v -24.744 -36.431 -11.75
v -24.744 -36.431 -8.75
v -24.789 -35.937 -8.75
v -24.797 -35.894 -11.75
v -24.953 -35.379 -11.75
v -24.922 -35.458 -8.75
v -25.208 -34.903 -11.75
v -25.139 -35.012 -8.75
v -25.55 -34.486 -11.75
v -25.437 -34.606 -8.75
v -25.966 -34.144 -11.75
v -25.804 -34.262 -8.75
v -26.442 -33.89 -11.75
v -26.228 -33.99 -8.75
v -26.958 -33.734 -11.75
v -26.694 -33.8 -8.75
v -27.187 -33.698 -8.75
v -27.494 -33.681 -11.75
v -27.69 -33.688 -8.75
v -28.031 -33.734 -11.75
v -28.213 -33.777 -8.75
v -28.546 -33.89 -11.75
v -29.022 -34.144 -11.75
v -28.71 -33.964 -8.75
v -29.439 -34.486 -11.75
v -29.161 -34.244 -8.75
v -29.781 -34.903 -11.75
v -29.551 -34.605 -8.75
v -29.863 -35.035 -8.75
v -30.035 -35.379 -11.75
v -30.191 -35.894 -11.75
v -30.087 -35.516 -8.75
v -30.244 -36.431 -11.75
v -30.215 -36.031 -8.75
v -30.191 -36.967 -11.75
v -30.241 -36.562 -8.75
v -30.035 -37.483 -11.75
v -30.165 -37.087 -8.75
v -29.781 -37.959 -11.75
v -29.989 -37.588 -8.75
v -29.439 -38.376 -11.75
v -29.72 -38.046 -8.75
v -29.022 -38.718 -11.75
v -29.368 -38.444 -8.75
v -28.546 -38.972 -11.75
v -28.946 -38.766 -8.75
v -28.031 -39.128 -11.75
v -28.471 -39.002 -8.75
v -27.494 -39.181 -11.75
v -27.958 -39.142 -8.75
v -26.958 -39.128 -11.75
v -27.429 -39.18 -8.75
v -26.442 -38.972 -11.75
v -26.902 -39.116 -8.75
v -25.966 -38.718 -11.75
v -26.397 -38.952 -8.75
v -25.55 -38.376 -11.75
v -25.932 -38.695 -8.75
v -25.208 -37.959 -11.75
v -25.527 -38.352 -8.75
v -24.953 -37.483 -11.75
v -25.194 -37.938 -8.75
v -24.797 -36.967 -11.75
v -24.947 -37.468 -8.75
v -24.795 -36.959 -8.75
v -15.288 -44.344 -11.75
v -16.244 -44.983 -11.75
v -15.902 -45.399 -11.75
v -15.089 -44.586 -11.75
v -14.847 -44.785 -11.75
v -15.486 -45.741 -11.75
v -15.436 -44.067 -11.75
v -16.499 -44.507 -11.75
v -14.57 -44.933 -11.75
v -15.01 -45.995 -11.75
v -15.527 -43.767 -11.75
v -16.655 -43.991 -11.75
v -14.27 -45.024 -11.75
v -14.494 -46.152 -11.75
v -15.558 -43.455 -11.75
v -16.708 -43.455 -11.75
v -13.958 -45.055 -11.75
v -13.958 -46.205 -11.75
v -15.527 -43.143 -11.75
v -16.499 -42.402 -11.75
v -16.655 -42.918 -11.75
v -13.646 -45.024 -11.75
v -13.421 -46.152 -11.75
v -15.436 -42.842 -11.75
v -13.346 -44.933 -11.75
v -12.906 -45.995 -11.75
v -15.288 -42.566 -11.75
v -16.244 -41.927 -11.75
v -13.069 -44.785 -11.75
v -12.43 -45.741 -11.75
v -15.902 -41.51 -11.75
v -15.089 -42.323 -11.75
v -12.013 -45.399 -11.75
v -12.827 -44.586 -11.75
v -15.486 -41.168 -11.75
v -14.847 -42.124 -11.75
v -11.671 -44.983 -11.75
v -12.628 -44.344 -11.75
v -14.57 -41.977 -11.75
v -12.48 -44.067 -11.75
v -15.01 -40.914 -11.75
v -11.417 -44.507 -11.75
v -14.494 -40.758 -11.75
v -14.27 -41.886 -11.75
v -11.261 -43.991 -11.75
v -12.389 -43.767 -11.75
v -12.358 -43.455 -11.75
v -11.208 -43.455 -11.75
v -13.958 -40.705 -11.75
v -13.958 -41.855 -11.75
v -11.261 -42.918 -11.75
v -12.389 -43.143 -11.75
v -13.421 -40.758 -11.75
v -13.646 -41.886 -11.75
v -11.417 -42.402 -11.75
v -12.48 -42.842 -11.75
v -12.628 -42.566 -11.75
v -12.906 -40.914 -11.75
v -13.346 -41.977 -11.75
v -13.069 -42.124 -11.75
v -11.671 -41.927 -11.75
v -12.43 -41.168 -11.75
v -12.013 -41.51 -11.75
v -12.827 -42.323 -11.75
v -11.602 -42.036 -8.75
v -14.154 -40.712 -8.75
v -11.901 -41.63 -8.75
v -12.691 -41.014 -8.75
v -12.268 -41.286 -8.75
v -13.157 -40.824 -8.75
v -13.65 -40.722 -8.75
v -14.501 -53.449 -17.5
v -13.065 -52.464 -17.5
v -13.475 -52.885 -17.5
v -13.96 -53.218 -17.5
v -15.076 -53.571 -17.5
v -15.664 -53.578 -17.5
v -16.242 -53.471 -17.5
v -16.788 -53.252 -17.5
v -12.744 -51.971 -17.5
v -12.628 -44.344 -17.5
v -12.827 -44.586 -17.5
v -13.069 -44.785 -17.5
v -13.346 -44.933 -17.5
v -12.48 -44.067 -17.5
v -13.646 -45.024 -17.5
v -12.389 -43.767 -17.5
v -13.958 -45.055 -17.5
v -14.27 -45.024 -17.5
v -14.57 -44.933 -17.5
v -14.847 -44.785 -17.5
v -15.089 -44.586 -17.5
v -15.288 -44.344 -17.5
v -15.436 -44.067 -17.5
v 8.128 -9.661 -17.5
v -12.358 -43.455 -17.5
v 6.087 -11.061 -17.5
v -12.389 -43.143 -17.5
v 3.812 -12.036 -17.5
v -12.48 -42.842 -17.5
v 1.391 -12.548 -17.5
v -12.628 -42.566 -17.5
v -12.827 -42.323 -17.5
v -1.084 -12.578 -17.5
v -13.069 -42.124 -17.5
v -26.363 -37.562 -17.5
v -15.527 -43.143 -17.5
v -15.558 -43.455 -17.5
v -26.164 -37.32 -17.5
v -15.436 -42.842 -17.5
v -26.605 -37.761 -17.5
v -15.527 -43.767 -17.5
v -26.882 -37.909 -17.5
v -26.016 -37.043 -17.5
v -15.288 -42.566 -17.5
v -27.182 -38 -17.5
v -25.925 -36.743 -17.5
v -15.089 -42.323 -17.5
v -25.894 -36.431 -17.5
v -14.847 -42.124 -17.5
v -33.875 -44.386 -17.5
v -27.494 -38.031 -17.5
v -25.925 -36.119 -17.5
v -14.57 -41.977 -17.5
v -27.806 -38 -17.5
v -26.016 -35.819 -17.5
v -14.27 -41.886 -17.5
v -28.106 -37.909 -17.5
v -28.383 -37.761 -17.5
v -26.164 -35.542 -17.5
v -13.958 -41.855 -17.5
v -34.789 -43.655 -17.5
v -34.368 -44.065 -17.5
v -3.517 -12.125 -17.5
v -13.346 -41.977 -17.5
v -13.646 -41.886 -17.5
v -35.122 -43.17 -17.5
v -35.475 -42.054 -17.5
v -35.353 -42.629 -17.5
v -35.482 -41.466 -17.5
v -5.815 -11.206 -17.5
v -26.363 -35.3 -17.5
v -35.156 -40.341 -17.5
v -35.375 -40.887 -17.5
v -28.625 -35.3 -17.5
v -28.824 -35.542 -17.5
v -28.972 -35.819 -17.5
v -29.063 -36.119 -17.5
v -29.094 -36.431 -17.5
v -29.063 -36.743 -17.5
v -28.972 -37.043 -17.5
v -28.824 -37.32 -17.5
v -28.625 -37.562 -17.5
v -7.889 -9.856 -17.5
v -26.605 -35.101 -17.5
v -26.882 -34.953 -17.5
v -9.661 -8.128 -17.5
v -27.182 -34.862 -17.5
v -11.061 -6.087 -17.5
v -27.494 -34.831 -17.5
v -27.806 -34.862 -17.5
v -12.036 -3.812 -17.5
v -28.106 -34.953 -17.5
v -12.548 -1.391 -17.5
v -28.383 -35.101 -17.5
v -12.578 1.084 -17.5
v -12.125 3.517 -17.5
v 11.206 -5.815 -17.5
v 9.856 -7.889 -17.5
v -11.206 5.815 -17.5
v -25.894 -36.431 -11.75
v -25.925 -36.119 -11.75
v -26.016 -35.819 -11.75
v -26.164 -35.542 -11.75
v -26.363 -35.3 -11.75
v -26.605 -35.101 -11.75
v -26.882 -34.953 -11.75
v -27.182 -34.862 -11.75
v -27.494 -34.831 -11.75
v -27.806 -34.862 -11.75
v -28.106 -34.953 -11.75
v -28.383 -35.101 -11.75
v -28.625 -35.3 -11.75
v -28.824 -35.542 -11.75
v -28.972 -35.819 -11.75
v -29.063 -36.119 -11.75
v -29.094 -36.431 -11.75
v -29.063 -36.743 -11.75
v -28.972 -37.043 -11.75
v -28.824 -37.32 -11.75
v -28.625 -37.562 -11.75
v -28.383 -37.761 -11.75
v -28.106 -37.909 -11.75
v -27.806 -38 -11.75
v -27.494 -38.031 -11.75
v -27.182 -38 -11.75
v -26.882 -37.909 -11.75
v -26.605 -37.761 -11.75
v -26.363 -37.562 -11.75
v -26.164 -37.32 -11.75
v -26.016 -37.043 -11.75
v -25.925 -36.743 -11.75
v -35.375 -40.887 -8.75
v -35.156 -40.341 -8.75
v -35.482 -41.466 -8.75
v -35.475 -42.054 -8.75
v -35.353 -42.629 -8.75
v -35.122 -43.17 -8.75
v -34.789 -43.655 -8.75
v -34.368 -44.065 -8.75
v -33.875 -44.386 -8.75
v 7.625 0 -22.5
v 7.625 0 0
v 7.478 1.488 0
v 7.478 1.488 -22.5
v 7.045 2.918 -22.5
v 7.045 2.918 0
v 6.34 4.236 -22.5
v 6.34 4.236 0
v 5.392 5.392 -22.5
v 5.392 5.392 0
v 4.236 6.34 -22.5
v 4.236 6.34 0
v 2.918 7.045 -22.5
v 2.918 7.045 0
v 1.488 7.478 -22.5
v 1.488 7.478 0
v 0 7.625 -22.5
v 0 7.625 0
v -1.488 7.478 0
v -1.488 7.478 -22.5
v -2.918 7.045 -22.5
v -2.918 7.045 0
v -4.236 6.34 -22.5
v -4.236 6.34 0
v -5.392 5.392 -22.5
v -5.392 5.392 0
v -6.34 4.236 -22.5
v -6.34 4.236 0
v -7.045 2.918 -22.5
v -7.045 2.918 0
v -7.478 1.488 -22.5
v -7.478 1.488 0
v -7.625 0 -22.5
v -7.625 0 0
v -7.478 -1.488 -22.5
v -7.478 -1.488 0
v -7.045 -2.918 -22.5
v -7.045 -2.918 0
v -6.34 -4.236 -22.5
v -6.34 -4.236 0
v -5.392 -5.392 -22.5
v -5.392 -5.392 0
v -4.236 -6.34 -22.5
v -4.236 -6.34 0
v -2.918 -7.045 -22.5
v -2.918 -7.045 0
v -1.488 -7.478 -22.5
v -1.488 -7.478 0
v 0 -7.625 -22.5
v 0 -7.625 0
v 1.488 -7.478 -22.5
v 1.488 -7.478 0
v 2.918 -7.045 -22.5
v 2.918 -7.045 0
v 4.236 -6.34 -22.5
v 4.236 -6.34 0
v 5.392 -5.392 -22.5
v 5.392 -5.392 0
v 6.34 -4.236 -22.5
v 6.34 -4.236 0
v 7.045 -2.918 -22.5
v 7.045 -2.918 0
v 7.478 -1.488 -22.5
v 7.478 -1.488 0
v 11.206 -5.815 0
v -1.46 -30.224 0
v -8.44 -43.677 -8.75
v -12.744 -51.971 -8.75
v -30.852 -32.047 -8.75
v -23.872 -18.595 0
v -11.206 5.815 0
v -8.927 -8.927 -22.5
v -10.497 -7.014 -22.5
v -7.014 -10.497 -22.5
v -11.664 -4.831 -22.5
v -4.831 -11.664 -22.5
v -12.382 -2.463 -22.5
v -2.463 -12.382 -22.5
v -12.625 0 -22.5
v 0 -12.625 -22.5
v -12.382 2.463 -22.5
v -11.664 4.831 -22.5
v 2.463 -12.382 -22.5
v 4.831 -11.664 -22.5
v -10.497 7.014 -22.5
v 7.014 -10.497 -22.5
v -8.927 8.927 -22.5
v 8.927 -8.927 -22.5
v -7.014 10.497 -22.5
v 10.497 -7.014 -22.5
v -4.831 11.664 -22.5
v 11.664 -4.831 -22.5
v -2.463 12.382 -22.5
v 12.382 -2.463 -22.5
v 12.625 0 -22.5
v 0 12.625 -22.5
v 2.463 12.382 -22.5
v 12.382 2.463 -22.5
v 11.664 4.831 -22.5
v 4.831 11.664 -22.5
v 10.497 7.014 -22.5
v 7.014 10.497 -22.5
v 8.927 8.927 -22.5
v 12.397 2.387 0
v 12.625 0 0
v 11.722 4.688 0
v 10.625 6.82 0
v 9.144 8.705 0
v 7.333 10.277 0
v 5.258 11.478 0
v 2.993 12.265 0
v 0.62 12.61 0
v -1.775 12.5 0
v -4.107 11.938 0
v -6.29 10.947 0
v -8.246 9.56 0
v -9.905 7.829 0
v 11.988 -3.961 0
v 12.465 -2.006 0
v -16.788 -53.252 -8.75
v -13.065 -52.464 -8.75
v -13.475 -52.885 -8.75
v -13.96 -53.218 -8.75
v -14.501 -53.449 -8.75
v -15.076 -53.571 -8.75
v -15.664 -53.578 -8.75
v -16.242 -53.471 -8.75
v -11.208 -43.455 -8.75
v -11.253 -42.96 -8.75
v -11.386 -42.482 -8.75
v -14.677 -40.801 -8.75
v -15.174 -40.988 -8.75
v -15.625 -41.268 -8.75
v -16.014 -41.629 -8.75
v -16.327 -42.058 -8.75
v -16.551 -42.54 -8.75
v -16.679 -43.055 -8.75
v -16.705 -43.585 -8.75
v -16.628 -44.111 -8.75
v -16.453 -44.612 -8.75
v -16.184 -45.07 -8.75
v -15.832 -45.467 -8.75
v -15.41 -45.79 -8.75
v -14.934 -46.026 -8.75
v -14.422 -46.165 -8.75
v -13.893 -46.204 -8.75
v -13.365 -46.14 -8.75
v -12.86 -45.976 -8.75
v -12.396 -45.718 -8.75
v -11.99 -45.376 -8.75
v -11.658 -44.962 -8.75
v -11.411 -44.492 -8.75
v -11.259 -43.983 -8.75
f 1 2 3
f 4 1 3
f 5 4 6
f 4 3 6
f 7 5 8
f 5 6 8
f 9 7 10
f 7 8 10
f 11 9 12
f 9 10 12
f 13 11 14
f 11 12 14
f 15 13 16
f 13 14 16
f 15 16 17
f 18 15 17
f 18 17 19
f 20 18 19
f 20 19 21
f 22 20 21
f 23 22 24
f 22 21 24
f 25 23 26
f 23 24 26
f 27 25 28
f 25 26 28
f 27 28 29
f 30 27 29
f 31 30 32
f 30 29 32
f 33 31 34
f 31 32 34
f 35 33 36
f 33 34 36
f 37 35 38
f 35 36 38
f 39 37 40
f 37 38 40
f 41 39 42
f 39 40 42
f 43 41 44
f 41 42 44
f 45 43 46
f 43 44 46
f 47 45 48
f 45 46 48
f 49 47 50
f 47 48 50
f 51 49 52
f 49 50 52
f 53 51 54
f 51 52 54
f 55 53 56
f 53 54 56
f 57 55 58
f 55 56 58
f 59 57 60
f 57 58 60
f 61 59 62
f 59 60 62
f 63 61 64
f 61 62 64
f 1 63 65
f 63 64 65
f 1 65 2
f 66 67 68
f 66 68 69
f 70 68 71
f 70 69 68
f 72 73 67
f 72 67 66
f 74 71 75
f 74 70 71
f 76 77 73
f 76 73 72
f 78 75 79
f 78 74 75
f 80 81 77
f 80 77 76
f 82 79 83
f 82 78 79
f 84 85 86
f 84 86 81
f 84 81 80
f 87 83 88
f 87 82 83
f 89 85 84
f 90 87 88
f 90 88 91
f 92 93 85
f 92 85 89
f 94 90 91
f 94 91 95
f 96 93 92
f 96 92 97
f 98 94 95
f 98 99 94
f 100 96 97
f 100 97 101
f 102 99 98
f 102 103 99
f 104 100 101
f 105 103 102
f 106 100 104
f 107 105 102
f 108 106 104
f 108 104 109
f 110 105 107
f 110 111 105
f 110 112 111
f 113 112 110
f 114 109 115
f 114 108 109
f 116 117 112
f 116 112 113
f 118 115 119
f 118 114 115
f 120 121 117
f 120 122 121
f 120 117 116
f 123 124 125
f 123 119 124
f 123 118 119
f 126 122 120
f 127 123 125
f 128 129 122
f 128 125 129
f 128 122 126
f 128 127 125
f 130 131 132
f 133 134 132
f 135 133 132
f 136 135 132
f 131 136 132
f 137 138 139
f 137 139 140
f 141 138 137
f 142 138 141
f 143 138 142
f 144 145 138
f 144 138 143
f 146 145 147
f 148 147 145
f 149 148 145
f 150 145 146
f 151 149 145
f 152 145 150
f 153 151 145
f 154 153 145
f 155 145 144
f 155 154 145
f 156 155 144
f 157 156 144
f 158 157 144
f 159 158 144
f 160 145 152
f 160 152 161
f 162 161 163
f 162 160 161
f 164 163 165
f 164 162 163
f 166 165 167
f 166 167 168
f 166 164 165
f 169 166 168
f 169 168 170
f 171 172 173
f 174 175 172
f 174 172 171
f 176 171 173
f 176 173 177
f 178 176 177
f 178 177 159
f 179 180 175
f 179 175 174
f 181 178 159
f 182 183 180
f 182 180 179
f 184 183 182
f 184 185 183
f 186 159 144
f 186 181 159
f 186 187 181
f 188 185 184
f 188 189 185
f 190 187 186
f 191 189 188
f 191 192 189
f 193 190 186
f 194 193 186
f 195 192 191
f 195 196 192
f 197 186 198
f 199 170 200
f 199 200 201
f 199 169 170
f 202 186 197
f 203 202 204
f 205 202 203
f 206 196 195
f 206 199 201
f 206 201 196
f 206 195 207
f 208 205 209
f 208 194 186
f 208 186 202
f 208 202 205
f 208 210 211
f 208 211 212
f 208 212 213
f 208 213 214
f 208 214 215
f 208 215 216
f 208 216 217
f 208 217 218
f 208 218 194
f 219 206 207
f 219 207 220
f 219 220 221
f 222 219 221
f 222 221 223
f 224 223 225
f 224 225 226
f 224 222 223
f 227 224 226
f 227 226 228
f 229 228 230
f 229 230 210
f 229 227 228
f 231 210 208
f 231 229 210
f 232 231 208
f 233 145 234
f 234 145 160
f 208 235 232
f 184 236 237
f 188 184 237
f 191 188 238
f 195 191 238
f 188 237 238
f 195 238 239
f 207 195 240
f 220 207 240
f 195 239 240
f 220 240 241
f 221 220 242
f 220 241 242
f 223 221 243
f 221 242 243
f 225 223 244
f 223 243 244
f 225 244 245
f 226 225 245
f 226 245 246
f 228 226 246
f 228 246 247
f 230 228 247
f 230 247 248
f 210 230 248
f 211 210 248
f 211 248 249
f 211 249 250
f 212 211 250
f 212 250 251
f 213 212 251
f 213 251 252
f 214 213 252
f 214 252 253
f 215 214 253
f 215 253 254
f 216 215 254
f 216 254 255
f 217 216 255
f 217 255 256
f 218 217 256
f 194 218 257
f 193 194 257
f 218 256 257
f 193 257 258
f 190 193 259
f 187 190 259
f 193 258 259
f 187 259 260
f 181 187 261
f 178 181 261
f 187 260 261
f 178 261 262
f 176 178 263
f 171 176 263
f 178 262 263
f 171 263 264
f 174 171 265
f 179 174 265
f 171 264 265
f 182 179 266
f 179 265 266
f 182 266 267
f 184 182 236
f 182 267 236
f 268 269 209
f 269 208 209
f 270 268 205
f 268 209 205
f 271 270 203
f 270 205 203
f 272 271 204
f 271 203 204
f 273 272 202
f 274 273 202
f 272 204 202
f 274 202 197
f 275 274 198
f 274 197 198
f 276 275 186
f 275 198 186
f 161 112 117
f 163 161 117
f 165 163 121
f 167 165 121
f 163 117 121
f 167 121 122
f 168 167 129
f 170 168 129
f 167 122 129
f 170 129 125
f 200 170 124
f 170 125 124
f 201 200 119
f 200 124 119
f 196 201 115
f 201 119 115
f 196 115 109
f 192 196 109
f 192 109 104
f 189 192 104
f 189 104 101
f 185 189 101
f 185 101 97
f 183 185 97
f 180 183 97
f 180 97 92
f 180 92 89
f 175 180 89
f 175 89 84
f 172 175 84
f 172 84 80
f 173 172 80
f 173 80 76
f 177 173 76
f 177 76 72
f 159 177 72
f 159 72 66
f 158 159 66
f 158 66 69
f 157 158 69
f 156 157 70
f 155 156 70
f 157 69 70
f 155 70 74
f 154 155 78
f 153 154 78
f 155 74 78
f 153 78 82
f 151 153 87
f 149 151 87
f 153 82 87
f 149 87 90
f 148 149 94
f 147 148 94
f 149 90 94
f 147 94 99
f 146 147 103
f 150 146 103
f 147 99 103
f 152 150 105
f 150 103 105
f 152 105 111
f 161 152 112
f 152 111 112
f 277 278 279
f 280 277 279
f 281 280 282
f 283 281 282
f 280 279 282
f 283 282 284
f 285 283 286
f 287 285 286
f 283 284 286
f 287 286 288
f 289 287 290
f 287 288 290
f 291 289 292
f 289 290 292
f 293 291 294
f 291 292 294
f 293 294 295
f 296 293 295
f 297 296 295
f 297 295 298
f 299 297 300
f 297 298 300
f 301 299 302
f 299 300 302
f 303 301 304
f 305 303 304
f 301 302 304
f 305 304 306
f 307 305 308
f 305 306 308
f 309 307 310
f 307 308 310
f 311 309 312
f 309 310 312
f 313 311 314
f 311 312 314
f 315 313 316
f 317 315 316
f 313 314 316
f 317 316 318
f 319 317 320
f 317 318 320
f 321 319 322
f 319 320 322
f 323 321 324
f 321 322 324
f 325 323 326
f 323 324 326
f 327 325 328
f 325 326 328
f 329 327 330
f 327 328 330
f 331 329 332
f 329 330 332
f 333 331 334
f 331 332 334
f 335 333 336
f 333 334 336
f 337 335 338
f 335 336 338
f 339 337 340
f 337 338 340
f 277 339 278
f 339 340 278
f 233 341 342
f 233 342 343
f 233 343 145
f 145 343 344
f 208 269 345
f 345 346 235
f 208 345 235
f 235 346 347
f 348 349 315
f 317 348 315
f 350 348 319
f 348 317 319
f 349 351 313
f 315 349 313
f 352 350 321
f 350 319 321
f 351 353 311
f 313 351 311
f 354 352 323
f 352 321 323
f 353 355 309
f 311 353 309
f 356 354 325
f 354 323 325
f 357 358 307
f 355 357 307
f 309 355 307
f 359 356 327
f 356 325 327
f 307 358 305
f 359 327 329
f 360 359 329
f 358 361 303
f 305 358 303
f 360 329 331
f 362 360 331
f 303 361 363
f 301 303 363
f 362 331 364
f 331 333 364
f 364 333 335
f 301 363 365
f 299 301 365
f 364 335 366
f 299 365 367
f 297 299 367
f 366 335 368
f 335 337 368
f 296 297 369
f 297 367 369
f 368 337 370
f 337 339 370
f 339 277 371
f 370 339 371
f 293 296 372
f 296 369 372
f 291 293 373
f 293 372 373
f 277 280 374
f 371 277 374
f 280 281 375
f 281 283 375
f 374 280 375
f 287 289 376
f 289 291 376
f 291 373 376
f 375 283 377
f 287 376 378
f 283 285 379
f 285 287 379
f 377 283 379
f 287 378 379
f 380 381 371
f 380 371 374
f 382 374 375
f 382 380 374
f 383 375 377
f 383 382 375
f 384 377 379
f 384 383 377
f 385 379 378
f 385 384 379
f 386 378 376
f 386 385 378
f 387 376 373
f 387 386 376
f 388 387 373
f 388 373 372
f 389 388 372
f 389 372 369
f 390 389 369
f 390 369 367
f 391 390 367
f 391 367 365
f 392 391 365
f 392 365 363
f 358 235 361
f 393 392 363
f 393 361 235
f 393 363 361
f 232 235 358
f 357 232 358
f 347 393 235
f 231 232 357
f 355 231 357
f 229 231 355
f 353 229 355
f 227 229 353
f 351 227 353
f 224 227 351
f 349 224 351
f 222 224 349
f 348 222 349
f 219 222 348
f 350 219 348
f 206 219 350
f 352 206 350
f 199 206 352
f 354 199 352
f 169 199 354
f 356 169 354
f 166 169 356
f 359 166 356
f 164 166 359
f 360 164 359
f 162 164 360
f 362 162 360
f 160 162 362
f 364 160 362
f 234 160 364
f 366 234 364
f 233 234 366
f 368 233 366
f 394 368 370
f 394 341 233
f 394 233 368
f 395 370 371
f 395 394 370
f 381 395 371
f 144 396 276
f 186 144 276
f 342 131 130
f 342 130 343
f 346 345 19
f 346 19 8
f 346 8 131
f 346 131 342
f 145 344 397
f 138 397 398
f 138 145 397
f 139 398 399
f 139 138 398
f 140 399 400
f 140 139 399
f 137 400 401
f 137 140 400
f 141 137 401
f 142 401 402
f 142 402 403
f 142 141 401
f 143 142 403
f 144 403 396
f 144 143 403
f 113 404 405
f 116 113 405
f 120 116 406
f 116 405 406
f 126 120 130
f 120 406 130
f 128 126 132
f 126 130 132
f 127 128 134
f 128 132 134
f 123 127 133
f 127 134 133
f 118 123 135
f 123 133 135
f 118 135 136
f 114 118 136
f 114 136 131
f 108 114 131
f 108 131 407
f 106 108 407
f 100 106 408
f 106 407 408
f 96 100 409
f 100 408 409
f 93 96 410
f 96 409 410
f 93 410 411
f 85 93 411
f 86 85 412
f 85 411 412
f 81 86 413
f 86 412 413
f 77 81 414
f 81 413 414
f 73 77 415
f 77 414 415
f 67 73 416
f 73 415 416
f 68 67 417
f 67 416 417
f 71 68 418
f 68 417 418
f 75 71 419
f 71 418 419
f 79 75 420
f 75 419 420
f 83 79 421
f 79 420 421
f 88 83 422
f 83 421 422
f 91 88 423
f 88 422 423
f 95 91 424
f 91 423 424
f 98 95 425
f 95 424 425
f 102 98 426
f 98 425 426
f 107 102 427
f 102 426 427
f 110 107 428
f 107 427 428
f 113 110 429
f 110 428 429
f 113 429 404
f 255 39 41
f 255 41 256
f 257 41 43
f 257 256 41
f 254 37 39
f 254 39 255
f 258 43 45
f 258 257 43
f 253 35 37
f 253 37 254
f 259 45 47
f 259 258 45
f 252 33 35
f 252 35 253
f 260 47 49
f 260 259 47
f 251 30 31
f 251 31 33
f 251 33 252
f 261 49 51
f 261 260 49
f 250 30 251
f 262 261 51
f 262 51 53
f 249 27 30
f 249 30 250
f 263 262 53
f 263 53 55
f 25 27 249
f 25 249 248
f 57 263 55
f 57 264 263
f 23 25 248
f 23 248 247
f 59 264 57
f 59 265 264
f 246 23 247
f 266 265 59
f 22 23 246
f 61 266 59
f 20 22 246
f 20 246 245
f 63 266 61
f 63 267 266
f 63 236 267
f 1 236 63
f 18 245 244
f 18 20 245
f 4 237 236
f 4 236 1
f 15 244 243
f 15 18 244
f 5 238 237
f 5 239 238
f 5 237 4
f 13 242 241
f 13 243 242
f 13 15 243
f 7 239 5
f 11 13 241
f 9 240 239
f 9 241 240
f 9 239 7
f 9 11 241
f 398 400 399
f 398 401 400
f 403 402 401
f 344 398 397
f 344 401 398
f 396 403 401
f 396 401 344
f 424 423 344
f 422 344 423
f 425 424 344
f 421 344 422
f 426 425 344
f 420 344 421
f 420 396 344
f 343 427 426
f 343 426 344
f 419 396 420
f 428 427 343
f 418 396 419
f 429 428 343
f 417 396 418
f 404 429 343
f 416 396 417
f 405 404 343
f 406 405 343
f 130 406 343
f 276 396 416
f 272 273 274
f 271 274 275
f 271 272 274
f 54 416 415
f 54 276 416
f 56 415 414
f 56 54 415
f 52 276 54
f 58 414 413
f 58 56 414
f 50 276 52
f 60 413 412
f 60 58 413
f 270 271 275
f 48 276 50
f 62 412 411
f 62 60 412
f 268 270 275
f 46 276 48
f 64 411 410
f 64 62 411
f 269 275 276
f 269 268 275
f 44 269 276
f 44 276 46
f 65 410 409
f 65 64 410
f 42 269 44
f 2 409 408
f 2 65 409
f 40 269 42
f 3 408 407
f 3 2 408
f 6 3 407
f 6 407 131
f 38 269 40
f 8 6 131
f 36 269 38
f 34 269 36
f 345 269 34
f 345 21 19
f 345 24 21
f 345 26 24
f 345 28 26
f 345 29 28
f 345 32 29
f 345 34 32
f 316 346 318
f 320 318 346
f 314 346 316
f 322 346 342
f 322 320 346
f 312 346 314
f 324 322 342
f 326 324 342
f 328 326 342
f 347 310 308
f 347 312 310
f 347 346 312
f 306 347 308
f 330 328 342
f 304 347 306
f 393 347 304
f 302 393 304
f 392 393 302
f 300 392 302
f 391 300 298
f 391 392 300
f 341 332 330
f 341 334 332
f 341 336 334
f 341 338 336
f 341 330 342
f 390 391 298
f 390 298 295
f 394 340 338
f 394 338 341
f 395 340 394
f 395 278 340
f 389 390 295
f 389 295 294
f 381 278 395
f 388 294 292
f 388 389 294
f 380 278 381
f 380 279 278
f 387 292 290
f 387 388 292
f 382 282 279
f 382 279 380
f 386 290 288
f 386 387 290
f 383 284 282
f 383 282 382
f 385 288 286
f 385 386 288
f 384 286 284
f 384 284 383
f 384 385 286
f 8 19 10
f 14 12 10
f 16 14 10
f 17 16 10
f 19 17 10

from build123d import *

# Parameters (mm, degrees)
SKETCH_1_R          = 12.625
SKETCH_1_R_2        = 7.625
EXTRUDE_1_DEPTH     = 22.5
EXTRUDE_2_DEPTH     = 17.499994584
CUT_EXTRUDE_1_DEPTH = 70.296381035
FILLET_1_R          = 3
SKETCH_4_R          = 1.6
CUT_EXTRUDE_5_DEPTH = 66.731667206
SKETCH_5_R          = 2.75
CUT_EXTRUDE_6_DEPTH = 3


with BuildPart() as part:
    # 草图1 → 凸台-拉伸1 (new body)
    with BuildSketch(Plane.XY):
        Circle(SKETCH_1_R)
        Circle(SKETCH_1_R_2, mode=Mode.SUBTRACT)
    extrude(amount=-EXTRUDE_1_DEPTH)

    # 草图2 → 凸台-拉伸2 (add)
    with BuildSketch(Plane.XY):
        with BuildLine():
            Line((11.206194864, -5.814793347), (-14.125578135, -54.633860081))
            Line((-14.125578135, -54.633860081), (-36.537967862, -43.004273386))
            Line((-36.537967862, -43.004273386), (-11.206194864, 5.814793347))
            ThreePointArc((-11.206194864, 5.814793347), (-5.814793347, -11.206194864), (11.206194864, -5.814793347))
        make_face()
    extrude(amount=-EXTRUDE_2_DEPTH)

    # 草图3 → 切除-拉伸1 (cut, through all)
    with BuildSketch(Plane(origin=(-11.206194864, 5.814793347, 0), x_dir=(0, 0, 1), z_dir=(-0.8876193951581107, 0.46057769088303635, 0))):
        Polygon((-8.749997893, -55), (-8.749997893, -42.655440917), (0, -27.5), (0, -55), align=None)
    extrude(amount=-CUT_EXTRUDE_1_DEPTH, mode=Mode.SUBTRACT)

    # 圆角1
    fillet_1_edges = [part.edges().sort_by_distance(p)[0] for p in [
        (-14.125578135, -54.633860081, -13.124996239),
        (-36.537967862, -43.004273386, -13.124996239),
    ]]
    fillet(fillet_1_edges, radius=FILLET_1_R)

    # 草图4 → 切除-拉伸5 (cut, through all)
    with BuildSketch(Plane.XY.offset(-8.749997893)):
        with Locations((-13.957898202, -43.454777675)):
            Circle(SKETCH_4_R)
        with Locations((-27.494093978, -36.430967889)):
            Circle(SKETCH_4_R)
    extrude(amount=-CUT_EXTRUDE_5_DEPTH, mode=Mode.SUBTRACT)

    # 草图5 → 切除-拉伸6 (cut)
    with BuildSketch(Plane.XY.offset(-8.749997893)):
        with Locations((-13.957898202, -43.454777675)):
            Circle(SKETCH_5_R)
        with Locations((-27.494093978, -36.430967889)):
            Circle(SKETCH_5_R)
    extrude(amount=-CUT_EXTRUDE_6_DEPTH, mode=Mode.SUBTRACT)


solid = part.part
